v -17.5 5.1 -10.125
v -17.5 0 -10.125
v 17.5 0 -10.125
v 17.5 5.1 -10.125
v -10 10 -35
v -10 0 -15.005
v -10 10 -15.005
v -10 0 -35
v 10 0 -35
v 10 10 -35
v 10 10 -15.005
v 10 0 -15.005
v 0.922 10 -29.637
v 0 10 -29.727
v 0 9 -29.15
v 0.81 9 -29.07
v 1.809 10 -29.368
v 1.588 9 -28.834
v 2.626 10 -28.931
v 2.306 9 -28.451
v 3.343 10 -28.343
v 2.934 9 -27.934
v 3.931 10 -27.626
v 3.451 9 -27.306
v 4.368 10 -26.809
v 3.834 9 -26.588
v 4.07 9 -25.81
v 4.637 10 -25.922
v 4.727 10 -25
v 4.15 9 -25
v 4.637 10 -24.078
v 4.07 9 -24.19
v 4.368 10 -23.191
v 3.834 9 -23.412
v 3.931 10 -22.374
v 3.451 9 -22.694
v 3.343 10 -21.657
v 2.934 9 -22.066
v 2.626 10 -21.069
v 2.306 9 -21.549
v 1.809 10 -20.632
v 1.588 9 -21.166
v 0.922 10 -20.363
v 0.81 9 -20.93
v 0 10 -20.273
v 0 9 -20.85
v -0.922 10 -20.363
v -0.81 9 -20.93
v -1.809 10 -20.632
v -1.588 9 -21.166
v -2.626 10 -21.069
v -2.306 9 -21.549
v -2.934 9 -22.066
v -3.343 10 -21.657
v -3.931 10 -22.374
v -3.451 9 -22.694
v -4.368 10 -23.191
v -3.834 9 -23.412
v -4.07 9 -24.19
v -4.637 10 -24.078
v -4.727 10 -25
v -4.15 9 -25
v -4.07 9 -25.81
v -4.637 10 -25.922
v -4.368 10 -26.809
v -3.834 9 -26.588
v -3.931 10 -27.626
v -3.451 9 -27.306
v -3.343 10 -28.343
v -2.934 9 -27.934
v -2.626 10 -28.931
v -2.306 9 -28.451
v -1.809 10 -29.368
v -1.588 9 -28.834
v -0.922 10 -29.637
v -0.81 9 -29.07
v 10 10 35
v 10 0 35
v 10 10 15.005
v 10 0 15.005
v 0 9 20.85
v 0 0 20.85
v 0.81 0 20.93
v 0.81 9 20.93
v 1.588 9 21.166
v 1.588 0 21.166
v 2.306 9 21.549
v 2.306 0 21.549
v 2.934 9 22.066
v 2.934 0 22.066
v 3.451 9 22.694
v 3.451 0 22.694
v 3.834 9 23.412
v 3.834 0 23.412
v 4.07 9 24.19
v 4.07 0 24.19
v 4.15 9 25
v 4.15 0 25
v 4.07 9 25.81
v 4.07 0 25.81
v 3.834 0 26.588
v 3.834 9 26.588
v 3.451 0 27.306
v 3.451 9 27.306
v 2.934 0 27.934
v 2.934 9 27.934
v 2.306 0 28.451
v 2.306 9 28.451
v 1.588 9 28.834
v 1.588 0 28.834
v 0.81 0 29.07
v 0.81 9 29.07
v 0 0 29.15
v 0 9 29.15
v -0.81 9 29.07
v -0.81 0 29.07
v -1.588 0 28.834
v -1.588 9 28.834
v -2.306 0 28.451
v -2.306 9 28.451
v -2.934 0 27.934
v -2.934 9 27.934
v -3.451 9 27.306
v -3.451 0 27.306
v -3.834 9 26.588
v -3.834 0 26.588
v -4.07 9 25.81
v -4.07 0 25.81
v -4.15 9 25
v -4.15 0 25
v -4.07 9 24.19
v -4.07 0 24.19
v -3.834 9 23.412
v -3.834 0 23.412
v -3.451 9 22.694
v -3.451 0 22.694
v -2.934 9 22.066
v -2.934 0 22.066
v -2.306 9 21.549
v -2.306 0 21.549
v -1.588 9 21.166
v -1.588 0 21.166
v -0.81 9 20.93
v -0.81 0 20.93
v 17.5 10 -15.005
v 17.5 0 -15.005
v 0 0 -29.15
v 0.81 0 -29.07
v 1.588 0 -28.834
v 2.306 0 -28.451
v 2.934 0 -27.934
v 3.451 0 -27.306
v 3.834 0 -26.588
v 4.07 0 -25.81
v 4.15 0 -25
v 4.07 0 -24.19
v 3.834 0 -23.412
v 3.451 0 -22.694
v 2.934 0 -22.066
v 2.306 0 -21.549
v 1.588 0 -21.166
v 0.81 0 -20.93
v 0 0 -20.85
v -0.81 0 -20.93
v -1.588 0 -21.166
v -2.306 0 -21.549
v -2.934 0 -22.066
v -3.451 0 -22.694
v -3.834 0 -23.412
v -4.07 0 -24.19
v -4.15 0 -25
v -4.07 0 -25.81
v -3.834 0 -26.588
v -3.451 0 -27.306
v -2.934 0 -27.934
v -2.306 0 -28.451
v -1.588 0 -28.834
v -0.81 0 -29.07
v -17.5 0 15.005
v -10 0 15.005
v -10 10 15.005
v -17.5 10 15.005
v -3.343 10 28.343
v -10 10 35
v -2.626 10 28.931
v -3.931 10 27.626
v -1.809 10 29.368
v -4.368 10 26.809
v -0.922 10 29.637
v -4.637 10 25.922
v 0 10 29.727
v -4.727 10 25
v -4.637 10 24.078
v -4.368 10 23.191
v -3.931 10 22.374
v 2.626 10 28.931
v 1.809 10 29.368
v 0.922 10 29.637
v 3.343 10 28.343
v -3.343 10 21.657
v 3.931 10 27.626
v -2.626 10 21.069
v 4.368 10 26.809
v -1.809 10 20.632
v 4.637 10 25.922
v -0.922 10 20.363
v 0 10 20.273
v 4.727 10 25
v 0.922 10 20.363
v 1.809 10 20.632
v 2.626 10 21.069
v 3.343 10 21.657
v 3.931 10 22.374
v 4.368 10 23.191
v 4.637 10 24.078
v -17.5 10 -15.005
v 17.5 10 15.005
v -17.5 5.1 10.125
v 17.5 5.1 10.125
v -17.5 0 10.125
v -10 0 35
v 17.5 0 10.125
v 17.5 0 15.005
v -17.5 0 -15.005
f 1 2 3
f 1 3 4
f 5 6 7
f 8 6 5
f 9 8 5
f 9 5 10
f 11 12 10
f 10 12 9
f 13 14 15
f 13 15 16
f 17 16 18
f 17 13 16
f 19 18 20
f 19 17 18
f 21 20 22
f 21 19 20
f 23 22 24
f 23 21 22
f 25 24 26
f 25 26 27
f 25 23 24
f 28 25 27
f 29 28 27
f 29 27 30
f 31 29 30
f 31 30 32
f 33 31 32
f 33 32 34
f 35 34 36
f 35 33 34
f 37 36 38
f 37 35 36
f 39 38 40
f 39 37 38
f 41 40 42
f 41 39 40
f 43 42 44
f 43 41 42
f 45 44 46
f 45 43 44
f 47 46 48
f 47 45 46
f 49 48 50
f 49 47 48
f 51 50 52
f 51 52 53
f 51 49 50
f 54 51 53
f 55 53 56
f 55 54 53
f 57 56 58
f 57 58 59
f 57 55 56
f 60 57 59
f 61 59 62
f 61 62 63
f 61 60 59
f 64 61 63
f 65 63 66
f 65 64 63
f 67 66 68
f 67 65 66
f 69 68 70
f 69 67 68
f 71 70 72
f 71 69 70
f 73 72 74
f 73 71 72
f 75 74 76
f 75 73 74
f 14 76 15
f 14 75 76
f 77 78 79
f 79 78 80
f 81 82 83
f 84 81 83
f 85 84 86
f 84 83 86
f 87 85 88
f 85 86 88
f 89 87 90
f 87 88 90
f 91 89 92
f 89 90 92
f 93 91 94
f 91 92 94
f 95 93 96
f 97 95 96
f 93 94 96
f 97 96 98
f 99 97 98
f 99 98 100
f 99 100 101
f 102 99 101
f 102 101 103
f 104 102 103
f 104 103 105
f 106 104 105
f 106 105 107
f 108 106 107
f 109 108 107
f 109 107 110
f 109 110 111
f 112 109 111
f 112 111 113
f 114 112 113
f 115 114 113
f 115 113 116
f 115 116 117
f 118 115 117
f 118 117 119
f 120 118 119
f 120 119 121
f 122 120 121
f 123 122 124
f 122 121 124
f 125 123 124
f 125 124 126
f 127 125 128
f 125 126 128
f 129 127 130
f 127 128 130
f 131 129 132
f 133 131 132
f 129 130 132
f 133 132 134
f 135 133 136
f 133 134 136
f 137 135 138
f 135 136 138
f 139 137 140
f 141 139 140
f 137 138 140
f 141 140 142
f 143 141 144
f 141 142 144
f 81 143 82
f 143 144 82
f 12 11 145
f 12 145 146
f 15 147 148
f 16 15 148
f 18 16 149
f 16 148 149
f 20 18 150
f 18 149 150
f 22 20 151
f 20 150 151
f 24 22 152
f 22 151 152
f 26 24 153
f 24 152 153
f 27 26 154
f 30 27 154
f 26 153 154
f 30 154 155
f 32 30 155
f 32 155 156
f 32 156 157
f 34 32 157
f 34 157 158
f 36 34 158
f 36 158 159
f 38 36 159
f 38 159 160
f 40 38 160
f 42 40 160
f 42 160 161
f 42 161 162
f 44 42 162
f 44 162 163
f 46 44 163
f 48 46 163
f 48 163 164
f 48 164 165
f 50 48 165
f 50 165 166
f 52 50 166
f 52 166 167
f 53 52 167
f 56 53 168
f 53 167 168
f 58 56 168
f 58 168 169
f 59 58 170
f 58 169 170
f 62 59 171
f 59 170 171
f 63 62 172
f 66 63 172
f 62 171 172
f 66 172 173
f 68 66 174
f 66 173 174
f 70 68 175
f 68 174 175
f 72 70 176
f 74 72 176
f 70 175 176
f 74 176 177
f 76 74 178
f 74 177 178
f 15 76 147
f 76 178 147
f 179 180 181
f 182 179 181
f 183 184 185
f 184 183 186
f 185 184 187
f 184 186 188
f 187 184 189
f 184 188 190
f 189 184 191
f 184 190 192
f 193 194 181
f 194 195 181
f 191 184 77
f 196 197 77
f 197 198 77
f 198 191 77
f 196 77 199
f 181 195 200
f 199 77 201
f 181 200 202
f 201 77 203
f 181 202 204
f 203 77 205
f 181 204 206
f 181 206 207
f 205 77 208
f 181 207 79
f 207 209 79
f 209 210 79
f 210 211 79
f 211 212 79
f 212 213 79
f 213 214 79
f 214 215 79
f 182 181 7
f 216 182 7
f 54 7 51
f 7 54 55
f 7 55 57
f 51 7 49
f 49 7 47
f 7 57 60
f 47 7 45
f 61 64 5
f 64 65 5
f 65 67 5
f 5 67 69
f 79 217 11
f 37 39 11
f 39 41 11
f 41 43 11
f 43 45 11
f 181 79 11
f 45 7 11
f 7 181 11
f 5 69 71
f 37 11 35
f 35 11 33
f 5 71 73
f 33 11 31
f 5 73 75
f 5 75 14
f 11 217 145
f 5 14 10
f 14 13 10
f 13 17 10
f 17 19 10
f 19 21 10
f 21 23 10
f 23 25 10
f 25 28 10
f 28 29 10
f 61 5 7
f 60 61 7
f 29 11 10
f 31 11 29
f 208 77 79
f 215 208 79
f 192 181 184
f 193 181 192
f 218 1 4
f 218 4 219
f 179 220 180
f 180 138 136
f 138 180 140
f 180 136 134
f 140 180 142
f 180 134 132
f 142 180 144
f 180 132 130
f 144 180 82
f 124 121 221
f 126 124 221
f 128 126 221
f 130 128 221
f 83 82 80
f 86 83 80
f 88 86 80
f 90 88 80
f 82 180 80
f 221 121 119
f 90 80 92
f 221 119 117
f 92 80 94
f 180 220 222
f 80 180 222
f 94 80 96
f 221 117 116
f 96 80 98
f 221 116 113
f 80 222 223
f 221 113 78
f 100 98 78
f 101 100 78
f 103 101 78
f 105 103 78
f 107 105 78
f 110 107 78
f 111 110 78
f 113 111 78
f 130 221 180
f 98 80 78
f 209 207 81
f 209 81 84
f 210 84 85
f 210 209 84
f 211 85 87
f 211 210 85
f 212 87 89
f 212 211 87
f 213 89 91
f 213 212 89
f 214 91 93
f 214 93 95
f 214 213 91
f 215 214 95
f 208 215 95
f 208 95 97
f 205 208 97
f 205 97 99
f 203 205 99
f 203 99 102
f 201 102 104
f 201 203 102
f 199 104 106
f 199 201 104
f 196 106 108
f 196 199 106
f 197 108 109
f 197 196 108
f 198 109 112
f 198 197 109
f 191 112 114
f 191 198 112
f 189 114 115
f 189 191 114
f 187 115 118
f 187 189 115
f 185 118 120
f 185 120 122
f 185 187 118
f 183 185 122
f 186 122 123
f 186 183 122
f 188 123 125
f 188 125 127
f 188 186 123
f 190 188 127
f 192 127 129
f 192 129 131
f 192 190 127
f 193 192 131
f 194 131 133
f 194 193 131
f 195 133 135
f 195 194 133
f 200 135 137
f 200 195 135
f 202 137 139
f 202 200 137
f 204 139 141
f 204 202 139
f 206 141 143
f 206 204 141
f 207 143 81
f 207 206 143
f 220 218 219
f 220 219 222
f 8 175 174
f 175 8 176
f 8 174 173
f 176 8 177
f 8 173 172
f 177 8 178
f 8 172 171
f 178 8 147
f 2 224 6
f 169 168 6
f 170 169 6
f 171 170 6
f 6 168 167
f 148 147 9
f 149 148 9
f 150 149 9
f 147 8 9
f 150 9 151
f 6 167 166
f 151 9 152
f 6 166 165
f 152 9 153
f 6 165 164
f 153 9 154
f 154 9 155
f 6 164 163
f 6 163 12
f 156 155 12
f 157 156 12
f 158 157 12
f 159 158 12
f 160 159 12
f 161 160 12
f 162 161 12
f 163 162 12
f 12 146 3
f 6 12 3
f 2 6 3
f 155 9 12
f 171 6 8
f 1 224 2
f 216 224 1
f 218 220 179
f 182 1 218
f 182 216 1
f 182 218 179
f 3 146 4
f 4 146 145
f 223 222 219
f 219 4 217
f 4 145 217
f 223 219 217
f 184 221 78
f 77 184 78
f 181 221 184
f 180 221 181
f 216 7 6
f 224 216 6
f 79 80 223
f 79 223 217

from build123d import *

# Parameters (mm, degrees)
SKETCH1_W                = 20
SKETCH1_H                = 70
BOSS_EXTRUDE1_DEPTH      = 10
SKETCH2_W                = 20.25
SKETCH2_H                = 5.1
CUT_EXTRUDE1_DEPTH       = 1
CUT_EXTRUDE1_DEPTH_BACK  = 21
SKETCH3_R                = 4.15
CUT_EXTRUDE2_DEPTH       = 11
BOSS_EXTRUDE2_DEPTH      = 7.5
BOSS_EXTRUDE2_DEPTH_BACK = 27.5
CHAMFER1_SIZE            = 1
CHAMFER1_SIZE2           = 0.577350269
CHAMFER1_PART_2_SIZE     = 1
CHAMFER1_PART_2_SIZE2    = 0.577350269


with BuildPart() as part:
    # Sketch1 → Boss-Extrude1 (new body)
    with BuildSketch(Plane(origin=(0, 0, 0), x_dir=(1, 0, 0), z_dir=(0, 1, 0))):
        Rectangle(SKETCH1_W, SKETCH1_H)
    extrude(amount=BOSS_EXTRUDE1_DEPTH)

    # Sketch2 → Cut-Extrude1 (cut, two sides)
    with BuildSketch(Plane(origin=(10, 0, 0), x_dir=(0, 0, -1), z_dir=(1, 0, 0))) as cut_extrude1_sk:
        with Locations((0, 2.55)):
            Rectangle(SKETCH2_W, SKETCH2_H)
    extrude(amount=CUT_EXTRUDE1_DEPTH, mode=Mode.SUBTRACT)
    extrude(cut_extrude1_sk.sketch, amount=-CUT_EXTRUDE1_DEPTH_BACK, mode=Mode.SUBTRACT)

    # Sketch3 → Cut-Extrude2 (cut, through all)
    with BuildSketch(Plane.XZ):
        with Locations(Location((0, 25, 0), (0, 0, 270))):  # turned: the seam where the file's is
            Circle(SKETCH3_R)
        with Locations(Location((0, -25, 0), (0, 0, 270))):  # turned: the seam where the file's is
            Circle(SKETCH3_R)
    extrude(amount=-CUT_EXTRUDE2_DEPTH, mode=Mode.SUBTRACT)

    # Sketch4 → Boss-Extrude2 (add, two sides)
    with BuildSketch(Plane(origin=(10, 0, 0), x_dir=(0, 0, -1), z_dir=(1, 0, 0))) as boss_extrude2_sk:
        Polygon((-10.125, 0), (-15.005, 0), (-15.005, 10), (15.005, 10), (15.005, 0), (10.125, 0), (10.125, 5.1), (-10.125, 5.1), align=None)
    extrude(amount=BOSS_EXTRUDE2_DEPTH)
    extrude(boss_extrude2_sk.sketch, amount=-BOSS_EXTRUDE2_DEPTH_BACK)

    # Chamfer1
    chamfer1_edges = [part.edges().sort_by_distance(p)[0] for p in [
        (0, 10, 29.15),
    ]]
    chamfer1_side = [part.faces().sort_by_distance(p)[0] for p in [
        (0, 5, 29.15),
    ]]
    chamfer(chamfer1_edges, length=CHAMFER1_SIZE, length2=CHAMFER1_SIZE2, reference=chamfer1_side[0])

    # Chamfer1 part 2
    chamfer1_part_2_edges = [part.edges().sort_by_distance(p)[0] for p in [
        (0, 10, -20.85),
    ]]
    chamfer1_part_2_side = [part.faces().sort_by_distance(p)[0] for p in [
        (0, 5, -20.85),
    ]]
    chamfer(chamfer1_part_2_edges, length=CHAMFER1_PART_2_SIZE, length2=CHAMFER1_PART_2_SIZE2, reference=chamfer1_part_2_side[0])


solid = part.part
